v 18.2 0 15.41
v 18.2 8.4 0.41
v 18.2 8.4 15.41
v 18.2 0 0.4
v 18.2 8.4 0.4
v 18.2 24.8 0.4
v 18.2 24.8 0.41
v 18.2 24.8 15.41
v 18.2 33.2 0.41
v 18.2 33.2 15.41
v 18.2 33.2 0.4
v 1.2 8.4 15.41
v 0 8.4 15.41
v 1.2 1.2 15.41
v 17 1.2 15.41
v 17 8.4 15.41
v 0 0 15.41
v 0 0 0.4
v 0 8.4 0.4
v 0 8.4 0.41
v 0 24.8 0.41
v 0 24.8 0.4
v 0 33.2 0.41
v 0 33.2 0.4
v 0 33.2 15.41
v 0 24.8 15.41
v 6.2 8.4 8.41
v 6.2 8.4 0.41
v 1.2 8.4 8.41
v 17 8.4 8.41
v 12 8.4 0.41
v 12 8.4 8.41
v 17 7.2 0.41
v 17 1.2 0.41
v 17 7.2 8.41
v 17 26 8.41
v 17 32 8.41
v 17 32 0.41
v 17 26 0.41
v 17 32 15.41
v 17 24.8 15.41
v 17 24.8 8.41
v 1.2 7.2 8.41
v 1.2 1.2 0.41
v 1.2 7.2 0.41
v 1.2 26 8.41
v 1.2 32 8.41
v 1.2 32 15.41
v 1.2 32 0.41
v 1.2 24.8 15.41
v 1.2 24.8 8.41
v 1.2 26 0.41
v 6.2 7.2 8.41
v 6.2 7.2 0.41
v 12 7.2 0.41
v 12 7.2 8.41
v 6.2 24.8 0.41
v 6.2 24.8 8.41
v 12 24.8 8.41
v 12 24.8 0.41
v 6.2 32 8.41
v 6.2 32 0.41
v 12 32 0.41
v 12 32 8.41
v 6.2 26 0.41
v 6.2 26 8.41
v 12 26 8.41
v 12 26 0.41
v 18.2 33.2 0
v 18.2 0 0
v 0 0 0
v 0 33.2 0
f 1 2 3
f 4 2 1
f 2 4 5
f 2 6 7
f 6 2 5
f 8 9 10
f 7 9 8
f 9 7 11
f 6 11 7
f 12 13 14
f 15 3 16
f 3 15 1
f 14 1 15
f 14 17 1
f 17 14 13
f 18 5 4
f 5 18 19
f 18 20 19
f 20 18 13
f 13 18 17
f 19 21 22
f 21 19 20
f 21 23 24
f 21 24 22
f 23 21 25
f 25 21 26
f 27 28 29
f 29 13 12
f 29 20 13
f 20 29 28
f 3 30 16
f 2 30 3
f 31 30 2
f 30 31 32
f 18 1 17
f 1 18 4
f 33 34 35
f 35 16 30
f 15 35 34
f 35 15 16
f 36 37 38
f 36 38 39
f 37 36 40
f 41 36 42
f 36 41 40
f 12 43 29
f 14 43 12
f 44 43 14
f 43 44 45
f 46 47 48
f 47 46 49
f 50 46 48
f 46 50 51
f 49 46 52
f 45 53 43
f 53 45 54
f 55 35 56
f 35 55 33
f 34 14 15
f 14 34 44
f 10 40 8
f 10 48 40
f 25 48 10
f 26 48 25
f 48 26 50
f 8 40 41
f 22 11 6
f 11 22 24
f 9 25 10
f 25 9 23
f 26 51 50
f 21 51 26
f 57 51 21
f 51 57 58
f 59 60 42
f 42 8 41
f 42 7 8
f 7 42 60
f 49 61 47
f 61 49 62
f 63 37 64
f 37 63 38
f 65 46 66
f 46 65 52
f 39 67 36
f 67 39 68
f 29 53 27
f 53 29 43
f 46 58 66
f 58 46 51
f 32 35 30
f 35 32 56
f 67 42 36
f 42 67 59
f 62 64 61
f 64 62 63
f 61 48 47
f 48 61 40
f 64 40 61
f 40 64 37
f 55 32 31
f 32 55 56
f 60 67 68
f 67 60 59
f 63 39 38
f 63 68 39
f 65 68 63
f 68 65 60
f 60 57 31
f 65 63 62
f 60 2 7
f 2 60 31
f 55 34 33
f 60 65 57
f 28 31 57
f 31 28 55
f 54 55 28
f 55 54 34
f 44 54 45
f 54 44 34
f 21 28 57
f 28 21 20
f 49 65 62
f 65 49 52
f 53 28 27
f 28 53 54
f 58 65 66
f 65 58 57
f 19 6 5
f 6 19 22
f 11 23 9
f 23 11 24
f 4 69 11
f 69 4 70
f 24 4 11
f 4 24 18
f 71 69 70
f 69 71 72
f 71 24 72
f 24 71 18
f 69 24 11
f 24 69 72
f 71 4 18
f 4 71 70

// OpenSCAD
// file: ../../Base/Boxes.scad
// Fischertechnik Box Foundation
// Pre-designed Boxes

use <Constants.scad>

include <PlacementOptions.scad>

box190Width = 190;
box190Depth = 130;
box130Width = 130;
box130Depth = 95;
boxUsageHeight = 33.9;
boxWallThickness = 2.4;
boxBaseThickness = 1.0;
boxWebWidth = 3.0;

// getBoxWallThickness()
// Gets the wall thickness of a Fischertechnik Box

function getBoxWallThickness() = boxWallThickness;

// Gets the usable height of a fischertechnik box
function getBoxUsageHeight() = boxUsageHeight;

// Gets the thickness of the Fischertechnik box base.
function getBoxBaseThickness() = boxBaseThickness;

// Gets the width of a box web
function getBoxWebWidth() = boxWebWidth;

// Gets the usable inner space of a Box 190 as an x/y-list
function getBox190Space() = [
    box190Width - 2*getBoxWallThickness(), 
    box190Depth - 2*getBoxWallThickness() ];

// Imports the Fischertechnik empty box 130x190 mm and places it at position 0,0
// 190x130 are the outer sizes, the inner space is slightly smaller. Use getBox190Space() to get the inner sizes.
// This module needs the STL file "Fischertechnik Box 130x190.stl" in the library path.
// The box is positioned that the usable inner space is at the 0,0,0 position. The

module Box190() {
    translate([-getBoxWallThickness(),-getBoxWallThickness(),-getBoxBaseThickness()])
        import("Fischertechnik Box 130x190.stl", convexity=3);
}

// Gets the usable inner space of a Box 130 as an x/y-list
function getBox130Space() = [
    box130Width - 2*getBoxWallThickness(), 
    box130Depth - 2*getBoxWallThickness() ];

// Imports the Fischertechnik empty box 95x130 mm and places it at position 0,0
// 190x130 are the outer sizes, the inner space is slightly smaller. Use getBox190Space() to get the inner sizes.
// This module needs the STL file "Fischertechnik Box 95x130.stl" in the library path.
// The box is positioned that the usable inner space is at the 0,0,0 position. The

module Box130() {
    translate([-getBoxWallThickness(),-getBoxWallThickness(),-getBoxBaseThickness()])
        import("Fischertechnik Box 95x130.stl", convexity=3);
}

// Creates a web at the specified box walls
// corner 0 = LowerLeft, 1 = UpperLeft, 2 = UpperRight, 3 = LowerRight
// side 0 = LeftOfCorner, 1 = RightOfCorner
// distance = Distance in mm from the corner
// box = inner width and depth of the box (default: Box 190)
// webWidth = length of the web (default is 3 mms)
// webThickness = thickness of the web (default is 1 mm)

module BoxWeb(corner, side, distance, box=getBox190Space(), webWidth=getBoxWebWidth(), webThickness=1.0) {
    sink = getBoxWallThickness()/2;

    width = (corner % 2 == 0) ? 
            (side == LeftOfCorner ? webWidth : webThickness) :
            (side == LeftOfCorner ? webThickness : webWidth);

    depth = (corner % 2 == 0) ? 
            (side == RightOfCorner ? webWidth : webThickness) :
            (side == RightOfCorner ? webThickness : webWidth);
    
    xDiff = corner == LowerLeft ? 
                (side == LeftOfCorner ? -sink : distance) :
            (corner == UpperLeft ?                
                (side == LeftOfCorner ? distance : -sink) :
            (corner == UpperRight ?
                (side == LeftOfCorner ? box.x-webWidth+sink : box.x-distance-webThickness) :
                (side == LeftOfCorner ? box.x-distance-webThickness: box.x-webWidth+sink)));

    yDiff = corner == LowerLeft ? 
                (side == RightOfCorner ? -sink : distance) :
            (corner == UpperLeft ?
                (side == RightOfCorner ? box.y-distance : box.y-webWidth+sink) :
            (corner == UpperRight ?
                (side == RightOfCorner ? box.y-webWidth+sink : box.y-distance) :
                (side == RightOfCorner ? distance : -sink)));
    
    translate([xDiff, yDiff, -getExcess()])
        cube([width, depth, boxUsageHeight + 2*getExcess()]);
}
// file: ../../Base/Rotation.scad
// Fischertechnik Box Foundation
// Geometry Helpers Rotation

include <PlacementOptions.scad>

// getRotatedSpace(space, rotation=NoRotation)
// Rotates the space dependent on the specified rotation

function getRotatedSpace(space, rotation=NoRotation) = [
    (rotation == Rotate90 || rotation == Rotate270) ? space.y : space.x,
    (rotation == Rotate90 || rotation == Rotate270) ? space.x : space.y
];

// Rotates the given space around the fixed left lower corner
// space = the space the children needs as width/depth list [width,depth]
// rotation = 0 Rotate0 degrees, 1 Rotate90 degrees, 2 Rotate180 degrees, 3 Rotate270 degrees (equivalent to -90)

module RotateFix(space, rotation=Rotate0) {
    dy = (rotation == Rotate0 || rotation == Rotate270) ? 0 :
        (rotation == Rotate90) ? space.x :
        space.y;
    dx = (rotation < Rotate180) ? 0 :
        (rotation == Rotate180) ? space.x :
        space.y;
    
    translate([dx, dy, 0])
        rotate([0, 0, rotations[rotation]])
            children();
}
// file: ../../Base/Alignment.scad
// Fischertechnik Box Foundation
// Geometry Helpers Alignment

include <PlacementOptions.scad>

// getAlignedX(elementWidth, spaceWidth, align=AlignRight, offset=0)
// Gets the aligned X offset of an element with the given
// width in the given space.
// elementWidth = The width of the element to positon
// spaceWidth = The space where the element should be aligned
// align = 0 AlignLeft, 1 AlignCenter, 2 AlignRight
// offset = an optional offset from the aligned position. When
// aligned left or centered, then positive values are in X direction.
// When aligned right then positive values are in negative X direction.

function getAlignedX(elementWidth, spaceWidth, align=AlignRight, offset=0) =
    (align == AlignLeft) ?
        offset :
        ((align == AlignCenter) ?
        (spaceWidth - elementWidth)/2 + offset :
        spaceWidth - offset - elementWidth);

// getAlignedY(elementDepth, spaceDepth, align=AlignTop, offset=0)
// Gets the aligned Y offset of an element with the given
// depth in the given space.
// elementDepth = The depth of the element to positon
// spaceDepth = The space where the element should be aligned
// align = 0 AlignBottom, 1 AlignCenter, 2 AlignTop
// offset = an optional offset from the aligned position. When
// aligned bottom or centered, then positive values are in Y direction.
// When aligned top then positive values are in negative Y direction.

function getAlignedY(elementDepth, spaceDepth, align=AlignTop, offset=0) =
    (align == AlignBottom) ?
        offset :
        ((align == AlignCenter) ?
        (spaceDepth - elementDepth)/2 + offset :
        spaceDepth - offset - elementDepth);
// file: ../../Base/PlacementOptions.scad
// Fischertechnik Box Foundation
// Placement Options

// Alignment
NoAlign = 0;
AlignLeft = 1;
AlignBottom = 2;
AlignCenter = 3;
AlignRight = 4;
AlignTop = 5;

// Element rotation degree steps
rotations = [0, -90, -180, -270];

// Rotation
NoRotation = 0;
Rotate0 = 0;
Rotate90 = 1;
Rotate180 = 2;
Rotate270 = 3;

// Docking (seen from above)
NoDock = -1;
DockLeft = 0;
DockTop = 1;
DockRight = 2;
DockCorner = 2;
DockBottom = 3;

// Web corners
LowerLeft = 0;
UpperLeft = 1;
UpperRight = 2;
LowerRight = 3;

// Web position relative to corner
LeftOfCorner = 0;
RightOfCorner = 1;
// file: ../../Base/Placement.scad
// Fischertechnik Box Foundation
// Geometry Helpers Placement

use <Constants.scad>
use <Alignment.scad>
use <Rotation.scad>
use <Boxes.scad>

include <PlacementOptions.scad>

// Place(x=0, y=0, elementSpace=[0,0], alignX=AlignLeft, alignY=AlignBottom, rotation=Rotate0, boxSpace=getBox190Space())
// Places the child at the specified position
// y = Y-Position. This is a relative position when an X aligment is specified.
// x = X-Position. This is a relative position when an Y aligment is specified.
// elementSpace = space of the element to be placed [x,y]
// alignX = -1=NoAlign, 0 AlignLeft, 1 AlignCenter, 3 AlignRight (elementSpace and boxSpace required!)
// alignY = -1=NoAlign, 2 AlignBottom, 1 AlignCenter, 4 AlignTop (elementSpace and boxSpace required!)
// rotation = 0 Rotate0 0 degrees, 1 Rotate90 90 degrees, 
// 2 Rotate180 180 degrees, 3 Rotate270 270 degrees (equivalent to -90)
// boxSpace = Inner space of the box where the placement occurs [x,y] - default is Box 190x130 inner space

module Place(x=0, y=0, elementSpace=[0,0], 
  alignX=AlignLeft, alignY=AlignBottom, 
  rotation=NoRotation, boxSpace=getBox190Space()) {

    module Position(x, y, space, rotation=Rotate0) {
        translate([x, y, 0])
            RotateFix(space, rotation)
                children();
    }

    space = getRotatedSpace(elementSpace, rotation);
    alignedX = getAlignedX(space.x, boxSpace.x, alignX, x);
    alignedY = getAlignedY(space.y, boxSpace.y, alignY, y);
    Position(alignedX, alignedY, elementSpace, rotation)
        children();
}

// Center(space=getBox130Space(), elementSpace=[0,0])
// space = Space where the children is centered. For cylinder use centered=true and no elementSpace.
// elementSpace = space of the element to be centered [x,y]

module Center(space=getBox190Space(), elementSpace=[0,0]) {
    translate([(space.x - elementSpace.x) / 2, (space.y - elementSpace.y) / 2])
        children(0);
}

// CenterHorizontal(width=0, y=0, offset=0, space=getBox130Space())
// space = Space where the children is centered. For cylinder use centered=true and no elementSpace.
// elementSpace = space of the element to be centered [x,y]

module CenterHorizontal(width=0, y=0, offset=0, space=getBox190Space()) {
    translate([(space.x - width) / 2 + offset, y])
        children(0);
}

// CenterVertical(depth=0, x=0, offset=0, space=getBox130Space())
// space = Space where the children is centered. For cylinder use centered=true and no elementSpace.
// elementSpace = space of the element to be centered [x,y]

module CenterVertical(depth=0, x=0, offset=0, space=getBox190Space()) {
    translate([x, (space.y - depth) / 2 + offset])
        children(0);
}
// file: ../../Elements/AxisClip10.scad
// Fischertechnik Box Library
// Axis for clip 10
// 31023

use <../ModelBase/Simple.scad>

width = 12;
depth = 12;
height = 23;

// getAxisClip10Space()
// Gets the space of a frame for a clip 10 with spring ring (mot2)

function getAxisClip10Space() = [width, depth, height];

// AxisClip10()
// Axis for clip 10 with spring ring (mot2)

module AxisClip10() {
    LeveledAxisWithSpace(height, height-10, getAxisClip10Space());
}

// Tests
color("lightgray")
AxisClip10();
// file: ../../Base/Constants.scad
// Fischertechnik Box Foundation
// Constants

// Constant values necessary for multiple elements

// Base constants
dividerThickness = 1.2;
excess = 0.01;
fragments = 90;
tolerance = 0.8;

// Gets the thickness of a divider 
function getDividerThickness() = dividerThickness;

// Gets the excess that is used to merge walls into each other
function getExcess() = excess;

// Gets amount of fragments of a cylinder
function getFragments() = fragments;

// Gets the inner tolerance of a frame to each side
function getTolerance() = tolerance;


// Fischertechnik specific constants
axisDiameter = 4;
axisBottomDiameter = axisDiameter + 1;
standardEdgeDistance = 2.5;
standardWebDistance = 11.5;
standardCornerLength = 15;
tubeWallFactor = 0.8;

// Gets axis diameter
function getAxisDiameter() = axisDiameter;

// Gets axis bottom diameter for thicker part at the bottom
function getAxisBottomDiameter() = axisBottomDiameter;

// gets the standard distance to the wall of the box for dockable frames with webs
function getStandardEdgeDistance() = standardEdgeDistance;

// gets the standard distance of each web to the corner of the dockable frame
function getStandardWebDistance() = standardWebDistance;

// gets the standard length of the corner walls of a dockable frame
function getStandardCornerLength() = standardCornerLength;

// gets the wall thickness of a tube.
function getTubeWallThickness() = tubeWallFactor * getDividerThickness();
// file: ../../Elements/FramePlaneMirror.scad
// Fischertechnik Box Library
// Frame for Plane Mirror
// 31368 

use <../ModelBase/Simple.scad>
use <../ModelBase/Complex.scad>

width = 15;
depth = 30;
height = 8.0;

// getFramePlaneMirrorSpace()
// Gets the outer space the aperture frame needs.

function getFramePlaneMirrorSpace() = getFrameOuterVolume([width, depth, height]);

// FramePlaneMirror()
// Frame for a 15x30 mm plane mirror.

module FramePlaneMirror() {
    
    FrameSpecialFlat([width, depth, height]);
}

// Tests
color("lightgray") {
    FramePlaneMirror();
}
// file: ../TestPrint.scad
// 3D Print Test Base

use <../Base/Constants.scad>

use <../Elements/AxisClip10.scad>

module TestPrint(elementSpace) {
    cube([elementSpace.x, elementSpace.y, 0.4]);
    translate([0,0,0.4+getExcess()]) {
        children();
    }
}

TestPrint(getAxisClip10Space())
    AxisClip10();
// main file
// 3D Print Test Base
// FramePlaneMirror

use <../TestPrint.scad>
use <../../Elements/FramePlaneMirror.scad>

TestPrint(getFramePlaneMirrorSpace())
    FramePlaneMirror();
